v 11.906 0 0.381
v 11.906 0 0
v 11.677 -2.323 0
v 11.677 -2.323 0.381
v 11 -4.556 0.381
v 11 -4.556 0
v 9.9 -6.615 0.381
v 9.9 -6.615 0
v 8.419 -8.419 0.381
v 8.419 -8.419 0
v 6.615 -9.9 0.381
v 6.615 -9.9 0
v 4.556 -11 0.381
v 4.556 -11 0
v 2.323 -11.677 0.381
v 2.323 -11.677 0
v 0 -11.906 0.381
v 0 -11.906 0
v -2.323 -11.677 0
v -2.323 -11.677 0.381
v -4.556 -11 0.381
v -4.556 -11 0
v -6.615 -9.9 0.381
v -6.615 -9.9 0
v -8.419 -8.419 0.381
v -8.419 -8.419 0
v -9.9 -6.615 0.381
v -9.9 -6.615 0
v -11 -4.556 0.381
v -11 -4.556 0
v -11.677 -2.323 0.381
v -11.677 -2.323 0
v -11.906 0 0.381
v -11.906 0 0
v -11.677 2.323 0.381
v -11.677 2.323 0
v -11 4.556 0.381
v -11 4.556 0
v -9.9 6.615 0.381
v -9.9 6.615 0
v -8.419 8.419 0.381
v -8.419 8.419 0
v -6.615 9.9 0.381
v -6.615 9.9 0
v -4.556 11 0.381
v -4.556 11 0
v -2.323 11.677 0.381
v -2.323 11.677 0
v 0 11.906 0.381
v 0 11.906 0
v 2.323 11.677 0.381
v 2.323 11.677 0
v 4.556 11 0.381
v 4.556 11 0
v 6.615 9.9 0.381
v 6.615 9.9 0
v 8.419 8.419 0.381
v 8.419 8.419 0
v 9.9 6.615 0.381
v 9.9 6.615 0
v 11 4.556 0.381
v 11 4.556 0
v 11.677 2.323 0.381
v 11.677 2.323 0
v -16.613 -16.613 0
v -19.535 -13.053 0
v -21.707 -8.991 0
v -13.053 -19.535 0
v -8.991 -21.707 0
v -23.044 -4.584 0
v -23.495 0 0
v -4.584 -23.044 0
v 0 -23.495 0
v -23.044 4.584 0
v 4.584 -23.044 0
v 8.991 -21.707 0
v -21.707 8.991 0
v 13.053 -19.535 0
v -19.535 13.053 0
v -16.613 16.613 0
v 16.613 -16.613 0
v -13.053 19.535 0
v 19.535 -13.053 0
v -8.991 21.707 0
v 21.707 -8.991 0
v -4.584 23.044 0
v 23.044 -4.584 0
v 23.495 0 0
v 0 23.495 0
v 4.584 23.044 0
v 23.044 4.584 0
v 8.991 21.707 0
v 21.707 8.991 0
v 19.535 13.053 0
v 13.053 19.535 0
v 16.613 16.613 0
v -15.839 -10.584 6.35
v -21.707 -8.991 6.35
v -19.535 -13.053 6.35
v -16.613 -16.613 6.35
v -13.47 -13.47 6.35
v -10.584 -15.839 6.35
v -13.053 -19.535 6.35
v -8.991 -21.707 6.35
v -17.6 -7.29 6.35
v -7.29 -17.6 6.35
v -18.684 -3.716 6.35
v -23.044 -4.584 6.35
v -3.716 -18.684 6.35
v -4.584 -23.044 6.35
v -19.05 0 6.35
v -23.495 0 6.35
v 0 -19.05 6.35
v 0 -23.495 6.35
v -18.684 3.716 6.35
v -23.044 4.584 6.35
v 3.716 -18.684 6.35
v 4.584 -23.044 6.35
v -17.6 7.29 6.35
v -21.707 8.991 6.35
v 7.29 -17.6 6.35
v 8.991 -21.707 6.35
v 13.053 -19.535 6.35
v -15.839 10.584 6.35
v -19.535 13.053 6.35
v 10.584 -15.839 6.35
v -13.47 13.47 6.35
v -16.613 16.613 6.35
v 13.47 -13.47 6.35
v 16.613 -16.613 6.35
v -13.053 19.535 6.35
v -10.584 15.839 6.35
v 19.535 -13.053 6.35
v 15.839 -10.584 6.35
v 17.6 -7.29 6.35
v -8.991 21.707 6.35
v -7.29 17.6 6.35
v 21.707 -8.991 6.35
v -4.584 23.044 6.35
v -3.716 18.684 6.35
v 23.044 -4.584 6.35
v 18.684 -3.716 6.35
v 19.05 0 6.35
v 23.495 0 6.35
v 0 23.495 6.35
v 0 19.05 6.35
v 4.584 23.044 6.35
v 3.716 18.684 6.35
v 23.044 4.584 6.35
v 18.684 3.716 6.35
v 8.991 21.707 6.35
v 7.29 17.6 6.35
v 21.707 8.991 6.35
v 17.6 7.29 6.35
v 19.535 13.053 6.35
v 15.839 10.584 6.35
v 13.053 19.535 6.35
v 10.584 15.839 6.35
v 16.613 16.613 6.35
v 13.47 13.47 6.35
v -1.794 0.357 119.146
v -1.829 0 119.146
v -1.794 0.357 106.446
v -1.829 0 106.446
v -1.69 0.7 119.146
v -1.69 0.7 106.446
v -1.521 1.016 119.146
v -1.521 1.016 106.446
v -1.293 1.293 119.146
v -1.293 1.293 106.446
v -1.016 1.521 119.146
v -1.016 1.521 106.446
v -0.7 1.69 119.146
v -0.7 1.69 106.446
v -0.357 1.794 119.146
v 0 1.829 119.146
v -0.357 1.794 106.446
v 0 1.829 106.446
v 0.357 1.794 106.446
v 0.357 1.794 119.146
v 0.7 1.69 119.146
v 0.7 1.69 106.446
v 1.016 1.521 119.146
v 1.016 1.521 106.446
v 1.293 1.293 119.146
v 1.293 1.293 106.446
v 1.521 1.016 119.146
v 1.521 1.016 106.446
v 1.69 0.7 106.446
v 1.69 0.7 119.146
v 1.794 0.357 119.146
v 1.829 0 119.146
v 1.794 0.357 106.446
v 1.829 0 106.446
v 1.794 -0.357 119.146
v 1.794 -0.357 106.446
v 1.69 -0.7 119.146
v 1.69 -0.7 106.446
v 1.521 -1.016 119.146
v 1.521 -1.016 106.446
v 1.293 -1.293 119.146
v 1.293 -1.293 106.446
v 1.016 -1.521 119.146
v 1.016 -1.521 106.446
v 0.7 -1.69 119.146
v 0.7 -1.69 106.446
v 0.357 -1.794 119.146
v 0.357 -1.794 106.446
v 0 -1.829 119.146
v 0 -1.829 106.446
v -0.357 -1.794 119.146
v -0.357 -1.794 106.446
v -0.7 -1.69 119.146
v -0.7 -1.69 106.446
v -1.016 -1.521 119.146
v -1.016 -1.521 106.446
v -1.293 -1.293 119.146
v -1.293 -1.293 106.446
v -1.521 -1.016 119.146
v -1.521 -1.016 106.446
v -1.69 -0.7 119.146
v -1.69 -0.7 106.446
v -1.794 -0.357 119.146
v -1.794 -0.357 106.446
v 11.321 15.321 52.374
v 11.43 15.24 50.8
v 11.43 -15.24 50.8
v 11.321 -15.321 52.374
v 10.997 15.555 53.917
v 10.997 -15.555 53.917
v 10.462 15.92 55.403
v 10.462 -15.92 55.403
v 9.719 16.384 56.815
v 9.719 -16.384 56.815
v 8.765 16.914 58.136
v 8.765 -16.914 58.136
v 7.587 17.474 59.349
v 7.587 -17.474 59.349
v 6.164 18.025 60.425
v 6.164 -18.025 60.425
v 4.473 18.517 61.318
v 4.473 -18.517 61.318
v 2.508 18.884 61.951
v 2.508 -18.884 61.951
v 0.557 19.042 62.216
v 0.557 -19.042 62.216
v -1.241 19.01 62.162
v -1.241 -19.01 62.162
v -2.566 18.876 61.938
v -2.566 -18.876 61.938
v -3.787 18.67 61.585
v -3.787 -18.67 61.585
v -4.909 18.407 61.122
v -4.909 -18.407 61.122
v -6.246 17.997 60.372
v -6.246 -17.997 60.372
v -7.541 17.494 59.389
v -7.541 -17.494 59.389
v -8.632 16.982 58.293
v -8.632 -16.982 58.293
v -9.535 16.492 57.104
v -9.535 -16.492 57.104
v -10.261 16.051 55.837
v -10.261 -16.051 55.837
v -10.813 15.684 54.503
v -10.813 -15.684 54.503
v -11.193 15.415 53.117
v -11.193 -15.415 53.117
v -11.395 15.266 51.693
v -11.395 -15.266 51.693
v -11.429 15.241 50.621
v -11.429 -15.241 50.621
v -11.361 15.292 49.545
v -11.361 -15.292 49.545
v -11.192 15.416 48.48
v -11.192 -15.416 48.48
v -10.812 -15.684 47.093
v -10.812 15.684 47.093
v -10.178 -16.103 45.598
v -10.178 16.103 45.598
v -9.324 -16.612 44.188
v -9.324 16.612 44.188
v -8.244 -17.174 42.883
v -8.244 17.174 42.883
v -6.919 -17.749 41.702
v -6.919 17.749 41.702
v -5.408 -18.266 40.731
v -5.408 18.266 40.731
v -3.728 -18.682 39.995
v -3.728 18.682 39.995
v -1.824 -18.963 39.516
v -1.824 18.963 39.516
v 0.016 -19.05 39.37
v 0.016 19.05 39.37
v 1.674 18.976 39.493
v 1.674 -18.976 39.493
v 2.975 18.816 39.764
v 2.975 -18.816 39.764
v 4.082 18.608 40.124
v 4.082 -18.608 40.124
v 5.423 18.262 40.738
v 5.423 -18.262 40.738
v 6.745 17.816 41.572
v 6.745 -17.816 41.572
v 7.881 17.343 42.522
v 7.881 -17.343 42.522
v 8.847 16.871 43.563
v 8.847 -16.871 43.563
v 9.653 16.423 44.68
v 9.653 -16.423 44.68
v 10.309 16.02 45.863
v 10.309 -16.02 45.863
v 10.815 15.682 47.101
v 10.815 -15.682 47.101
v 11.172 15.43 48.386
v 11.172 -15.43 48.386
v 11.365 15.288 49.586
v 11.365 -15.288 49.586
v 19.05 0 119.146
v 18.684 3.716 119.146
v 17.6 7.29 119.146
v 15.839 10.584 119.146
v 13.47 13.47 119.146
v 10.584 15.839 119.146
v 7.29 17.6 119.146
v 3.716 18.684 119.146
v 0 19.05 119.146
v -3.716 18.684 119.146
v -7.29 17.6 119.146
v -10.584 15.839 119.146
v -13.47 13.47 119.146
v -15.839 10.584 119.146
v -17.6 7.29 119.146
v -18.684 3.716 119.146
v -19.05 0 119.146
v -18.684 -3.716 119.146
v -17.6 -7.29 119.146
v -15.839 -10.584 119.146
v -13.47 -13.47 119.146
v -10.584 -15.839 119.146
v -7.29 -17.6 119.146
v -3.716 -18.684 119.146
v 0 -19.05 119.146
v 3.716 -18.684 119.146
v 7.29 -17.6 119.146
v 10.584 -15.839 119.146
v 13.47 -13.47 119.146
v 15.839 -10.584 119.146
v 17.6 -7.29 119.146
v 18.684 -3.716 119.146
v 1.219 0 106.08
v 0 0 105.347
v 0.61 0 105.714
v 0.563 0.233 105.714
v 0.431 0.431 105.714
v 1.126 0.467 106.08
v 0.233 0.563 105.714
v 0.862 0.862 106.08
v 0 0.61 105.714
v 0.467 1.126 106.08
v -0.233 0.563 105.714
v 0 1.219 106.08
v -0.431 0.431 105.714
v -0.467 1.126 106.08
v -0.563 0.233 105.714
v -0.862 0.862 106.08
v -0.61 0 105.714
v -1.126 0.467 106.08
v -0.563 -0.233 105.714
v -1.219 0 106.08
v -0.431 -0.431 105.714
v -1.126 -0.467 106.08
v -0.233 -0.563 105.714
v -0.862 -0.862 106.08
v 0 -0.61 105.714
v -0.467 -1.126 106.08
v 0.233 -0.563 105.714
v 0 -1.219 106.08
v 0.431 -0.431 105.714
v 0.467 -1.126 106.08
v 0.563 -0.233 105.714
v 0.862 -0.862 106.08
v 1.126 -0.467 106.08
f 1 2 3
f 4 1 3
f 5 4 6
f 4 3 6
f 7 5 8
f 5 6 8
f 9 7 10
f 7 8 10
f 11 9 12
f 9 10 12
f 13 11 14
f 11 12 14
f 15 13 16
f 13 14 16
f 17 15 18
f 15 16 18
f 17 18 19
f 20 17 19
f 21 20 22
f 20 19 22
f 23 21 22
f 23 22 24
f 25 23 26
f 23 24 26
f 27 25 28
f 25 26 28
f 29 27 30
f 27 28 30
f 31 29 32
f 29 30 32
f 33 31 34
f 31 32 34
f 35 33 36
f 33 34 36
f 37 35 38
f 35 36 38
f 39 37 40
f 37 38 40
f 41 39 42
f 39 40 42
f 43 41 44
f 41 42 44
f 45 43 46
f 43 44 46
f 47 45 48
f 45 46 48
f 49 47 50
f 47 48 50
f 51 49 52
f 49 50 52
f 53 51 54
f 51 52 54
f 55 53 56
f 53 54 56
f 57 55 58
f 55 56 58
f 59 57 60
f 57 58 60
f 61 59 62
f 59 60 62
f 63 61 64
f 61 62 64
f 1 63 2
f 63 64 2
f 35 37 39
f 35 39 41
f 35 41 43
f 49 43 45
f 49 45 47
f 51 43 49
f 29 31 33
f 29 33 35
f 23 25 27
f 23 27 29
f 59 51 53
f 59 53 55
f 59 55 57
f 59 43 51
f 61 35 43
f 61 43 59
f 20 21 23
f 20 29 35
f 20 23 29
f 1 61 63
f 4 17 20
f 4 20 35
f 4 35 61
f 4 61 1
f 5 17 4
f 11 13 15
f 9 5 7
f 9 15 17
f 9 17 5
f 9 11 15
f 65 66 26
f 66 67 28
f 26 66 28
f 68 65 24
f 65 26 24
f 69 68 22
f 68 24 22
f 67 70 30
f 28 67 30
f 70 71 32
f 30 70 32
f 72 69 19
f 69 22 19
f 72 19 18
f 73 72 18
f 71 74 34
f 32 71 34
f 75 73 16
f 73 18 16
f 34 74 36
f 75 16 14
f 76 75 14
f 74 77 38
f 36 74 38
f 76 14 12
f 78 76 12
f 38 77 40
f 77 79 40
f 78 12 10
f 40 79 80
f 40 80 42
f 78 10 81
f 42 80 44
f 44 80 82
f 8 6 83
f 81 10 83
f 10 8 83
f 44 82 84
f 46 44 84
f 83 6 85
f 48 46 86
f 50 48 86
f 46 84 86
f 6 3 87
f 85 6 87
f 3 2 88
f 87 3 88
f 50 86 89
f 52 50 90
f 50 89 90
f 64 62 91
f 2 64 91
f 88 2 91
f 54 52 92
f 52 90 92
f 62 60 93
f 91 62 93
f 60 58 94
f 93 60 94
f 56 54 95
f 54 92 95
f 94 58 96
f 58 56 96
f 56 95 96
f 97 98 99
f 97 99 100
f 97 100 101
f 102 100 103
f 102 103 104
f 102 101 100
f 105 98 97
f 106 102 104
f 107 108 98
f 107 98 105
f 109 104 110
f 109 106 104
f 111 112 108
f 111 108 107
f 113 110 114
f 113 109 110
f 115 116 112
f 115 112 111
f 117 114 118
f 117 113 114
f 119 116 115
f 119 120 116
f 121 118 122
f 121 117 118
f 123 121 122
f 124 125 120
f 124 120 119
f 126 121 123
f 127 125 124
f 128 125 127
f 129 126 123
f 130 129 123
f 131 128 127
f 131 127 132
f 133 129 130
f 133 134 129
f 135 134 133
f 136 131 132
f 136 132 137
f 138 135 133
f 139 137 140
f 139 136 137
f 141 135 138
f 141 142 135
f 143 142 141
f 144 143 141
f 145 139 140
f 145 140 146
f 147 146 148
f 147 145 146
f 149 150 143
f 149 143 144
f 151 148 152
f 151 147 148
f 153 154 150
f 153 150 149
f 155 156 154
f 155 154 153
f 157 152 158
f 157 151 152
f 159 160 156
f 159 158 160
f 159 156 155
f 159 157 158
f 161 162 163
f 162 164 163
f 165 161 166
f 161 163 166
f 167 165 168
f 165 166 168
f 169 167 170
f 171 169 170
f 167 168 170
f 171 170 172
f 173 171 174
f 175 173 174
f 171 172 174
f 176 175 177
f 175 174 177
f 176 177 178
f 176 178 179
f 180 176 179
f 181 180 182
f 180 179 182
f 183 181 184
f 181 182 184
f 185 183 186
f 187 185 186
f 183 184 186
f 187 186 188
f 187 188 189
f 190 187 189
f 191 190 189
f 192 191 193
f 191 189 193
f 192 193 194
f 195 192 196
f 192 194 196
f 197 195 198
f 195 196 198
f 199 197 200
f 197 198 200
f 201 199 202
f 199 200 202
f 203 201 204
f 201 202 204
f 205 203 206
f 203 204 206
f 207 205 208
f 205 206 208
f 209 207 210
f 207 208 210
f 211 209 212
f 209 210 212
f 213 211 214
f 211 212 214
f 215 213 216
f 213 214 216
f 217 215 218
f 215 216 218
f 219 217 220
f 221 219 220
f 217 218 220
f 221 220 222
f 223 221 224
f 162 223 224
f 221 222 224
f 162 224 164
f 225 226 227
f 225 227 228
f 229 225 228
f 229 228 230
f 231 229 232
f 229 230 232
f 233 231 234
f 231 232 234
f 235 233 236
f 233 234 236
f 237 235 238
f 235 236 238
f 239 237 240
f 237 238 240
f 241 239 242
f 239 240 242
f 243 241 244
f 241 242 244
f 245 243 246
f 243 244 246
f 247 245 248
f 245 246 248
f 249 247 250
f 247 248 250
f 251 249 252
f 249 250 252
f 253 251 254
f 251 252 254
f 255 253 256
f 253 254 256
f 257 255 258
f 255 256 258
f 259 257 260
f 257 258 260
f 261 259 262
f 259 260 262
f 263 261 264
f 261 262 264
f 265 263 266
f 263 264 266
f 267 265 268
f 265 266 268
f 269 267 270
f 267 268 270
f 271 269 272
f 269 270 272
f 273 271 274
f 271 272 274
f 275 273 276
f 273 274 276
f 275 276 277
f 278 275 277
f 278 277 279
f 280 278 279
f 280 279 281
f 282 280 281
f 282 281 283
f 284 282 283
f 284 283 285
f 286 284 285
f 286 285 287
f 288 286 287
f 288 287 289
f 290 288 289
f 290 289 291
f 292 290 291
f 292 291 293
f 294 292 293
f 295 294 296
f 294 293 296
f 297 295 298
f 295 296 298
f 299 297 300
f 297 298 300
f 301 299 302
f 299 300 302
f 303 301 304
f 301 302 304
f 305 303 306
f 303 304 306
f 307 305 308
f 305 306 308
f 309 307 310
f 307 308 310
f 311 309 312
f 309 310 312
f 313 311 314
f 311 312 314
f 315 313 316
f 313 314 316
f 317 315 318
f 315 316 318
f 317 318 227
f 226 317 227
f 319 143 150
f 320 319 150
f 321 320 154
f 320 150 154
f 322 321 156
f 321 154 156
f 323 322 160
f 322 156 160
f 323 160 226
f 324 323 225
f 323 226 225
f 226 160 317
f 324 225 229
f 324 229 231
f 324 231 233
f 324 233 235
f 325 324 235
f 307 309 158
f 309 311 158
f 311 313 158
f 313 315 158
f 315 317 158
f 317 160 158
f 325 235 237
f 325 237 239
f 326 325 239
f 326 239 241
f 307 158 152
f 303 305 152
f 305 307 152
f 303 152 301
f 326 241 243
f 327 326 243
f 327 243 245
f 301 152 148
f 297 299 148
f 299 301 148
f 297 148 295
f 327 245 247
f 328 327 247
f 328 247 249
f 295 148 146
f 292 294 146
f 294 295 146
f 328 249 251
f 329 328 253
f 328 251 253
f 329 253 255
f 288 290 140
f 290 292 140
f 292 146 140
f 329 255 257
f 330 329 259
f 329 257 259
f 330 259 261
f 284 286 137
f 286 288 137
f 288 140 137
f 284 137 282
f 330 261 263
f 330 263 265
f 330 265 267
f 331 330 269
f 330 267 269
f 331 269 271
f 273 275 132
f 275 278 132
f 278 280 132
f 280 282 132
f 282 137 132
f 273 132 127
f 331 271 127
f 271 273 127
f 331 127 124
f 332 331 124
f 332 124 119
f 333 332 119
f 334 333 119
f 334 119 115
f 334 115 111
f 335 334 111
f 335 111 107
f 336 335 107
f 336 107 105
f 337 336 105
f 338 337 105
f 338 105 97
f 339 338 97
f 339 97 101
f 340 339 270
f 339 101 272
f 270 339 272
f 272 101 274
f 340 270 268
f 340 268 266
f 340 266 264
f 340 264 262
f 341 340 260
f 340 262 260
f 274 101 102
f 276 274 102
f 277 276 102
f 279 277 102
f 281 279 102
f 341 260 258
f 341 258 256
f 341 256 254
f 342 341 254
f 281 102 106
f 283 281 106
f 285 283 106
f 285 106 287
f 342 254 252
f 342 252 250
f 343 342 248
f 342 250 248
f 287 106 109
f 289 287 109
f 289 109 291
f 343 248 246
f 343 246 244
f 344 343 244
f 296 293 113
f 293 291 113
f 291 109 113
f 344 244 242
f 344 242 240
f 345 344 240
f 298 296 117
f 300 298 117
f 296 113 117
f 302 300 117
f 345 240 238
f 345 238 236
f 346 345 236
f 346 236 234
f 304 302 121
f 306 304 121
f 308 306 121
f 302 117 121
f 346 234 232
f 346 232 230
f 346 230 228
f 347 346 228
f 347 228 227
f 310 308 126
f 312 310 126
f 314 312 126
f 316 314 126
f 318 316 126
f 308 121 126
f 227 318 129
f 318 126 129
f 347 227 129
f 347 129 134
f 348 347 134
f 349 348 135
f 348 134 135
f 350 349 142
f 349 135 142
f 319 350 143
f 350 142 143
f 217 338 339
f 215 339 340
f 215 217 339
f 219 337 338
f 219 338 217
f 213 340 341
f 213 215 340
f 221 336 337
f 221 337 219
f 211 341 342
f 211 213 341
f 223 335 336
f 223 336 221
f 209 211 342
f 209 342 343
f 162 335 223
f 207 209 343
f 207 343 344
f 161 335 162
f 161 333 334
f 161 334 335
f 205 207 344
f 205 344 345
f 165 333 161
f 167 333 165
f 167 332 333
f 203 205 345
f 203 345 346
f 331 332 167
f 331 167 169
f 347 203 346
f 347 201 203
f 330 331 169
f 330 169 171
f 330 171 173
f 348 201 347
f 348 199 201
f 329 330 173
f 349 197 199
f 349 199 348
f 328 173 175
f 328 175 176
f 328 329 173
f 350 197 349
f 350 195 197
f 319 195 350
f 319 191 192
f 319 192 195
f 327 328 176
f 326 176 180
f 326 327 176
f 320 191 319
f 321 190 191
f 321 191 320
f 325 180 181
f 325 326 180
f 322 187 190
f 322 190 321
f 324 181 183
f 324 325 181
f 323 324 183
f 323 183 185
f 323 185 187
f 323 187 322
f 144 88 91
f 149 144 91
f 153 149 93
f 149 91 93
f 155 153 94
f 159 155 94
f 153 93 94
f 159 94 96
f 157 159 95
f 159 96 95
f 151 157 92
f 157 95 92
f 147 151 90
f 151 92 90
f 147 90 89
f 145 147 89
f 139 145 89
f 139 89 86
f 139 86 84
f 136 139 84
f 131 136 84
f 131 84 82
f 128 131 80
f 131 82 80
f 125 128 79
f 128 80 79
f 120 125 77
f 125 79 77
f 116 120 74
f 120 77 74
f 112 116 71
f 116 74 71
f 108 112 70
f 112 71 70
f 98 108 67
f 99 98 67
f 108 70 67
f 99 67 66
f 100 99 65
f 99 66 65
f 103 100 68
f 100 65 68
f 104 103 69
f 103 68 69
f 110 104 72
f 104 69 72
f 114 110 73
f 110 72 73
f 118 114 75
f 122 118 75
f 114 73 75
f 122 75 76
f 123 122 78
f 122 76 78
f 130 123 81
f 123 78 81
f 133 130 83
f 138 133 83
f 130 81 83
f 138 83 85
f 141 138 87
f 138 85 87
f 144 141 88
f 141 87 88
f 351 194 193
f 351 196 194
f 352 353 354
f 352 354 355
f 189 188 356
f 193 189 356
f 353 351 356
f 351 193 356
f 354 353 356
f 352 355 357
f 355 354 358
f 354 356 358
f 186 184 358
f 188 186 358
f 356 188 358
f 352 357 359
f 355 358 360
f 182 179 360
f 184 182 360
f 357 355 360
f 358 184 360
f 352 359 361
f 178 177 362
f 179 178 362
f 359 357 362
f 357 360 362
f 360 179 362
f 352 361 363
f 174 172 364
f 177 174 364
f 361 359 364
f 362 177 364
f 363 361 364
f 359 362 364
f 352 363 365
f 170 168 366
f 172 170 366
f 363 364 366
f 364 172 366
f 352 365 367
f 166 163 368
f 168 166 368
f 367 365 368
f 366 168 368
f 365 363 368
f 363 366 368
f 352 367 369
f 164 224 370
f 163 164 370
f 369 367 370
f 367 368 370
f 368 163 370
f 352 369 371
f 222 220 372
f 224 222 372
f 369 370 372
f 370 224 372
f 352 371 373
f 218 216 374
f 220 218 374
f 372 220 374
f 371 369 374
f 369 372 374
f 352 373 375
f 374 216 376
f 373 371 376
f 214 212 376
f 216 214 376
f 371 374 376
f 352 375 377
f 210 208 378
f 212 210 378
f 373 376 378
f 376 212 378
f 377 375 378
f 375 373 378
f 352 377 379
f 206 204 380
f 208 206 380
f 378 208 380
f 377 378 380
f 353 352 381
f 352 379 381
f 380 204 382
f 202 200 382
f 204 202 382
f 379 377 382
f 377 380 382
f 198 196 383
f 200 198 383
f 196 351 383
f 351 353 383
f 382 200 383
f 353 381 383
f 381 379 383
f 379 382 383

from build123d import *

# Parameters (mm, degrees)
F0_R     = 23.495
F0_R_2   = 19.05
F1_DEPTH = 6.35
F2_DEPTH = 119.14632
F4_D     = 3.6576
F4_DEPTH = 12.7
F4_TIP   = 1.0988539001
F5_R     = 11.43
F6_DEPTH = 25.4
F7_R     = 11.90625
F8_DEPTH = 0.381


with BuildPart() as f1:
    # F0 (on Top) → F1 (new body)
    with BuildSketch(Plane.XY):
        Circle(F0_R)
        Circle(F0_R_2, mode=Mode.SUBTRACT)
    extrude(amount=F1_DEPTH)

    # F0 (on Top) → F2 (join)
    with BuildSketch(Plane.XY):
        Circle(F0_R_2)
    extrude(amount=F2_DEPTH)

    # F4
    with Locations(Plane.XY.offset(119.14632)):
        with Locations((0, 0)):
            Hole(F4_D / 2, depth=F4_DEPTH)
            with Locations((0, 0, -(F4_DEPTH + F4_TIP / 2))):  # 118° drill point
                Cone(0, F4_D / 2, F4_TIP, mode=Mode.SUBTRACT)

    # F5 (on Front) → F6 (cut, symmetric)
    with BuildSketch(Plane.XZ):
        with Locations((0, 50.8)):
            Circle(F5_R)
    extrude(amount=F6_DEPTH, both=True, mode=Mode.SUBTRACT)

    # F7 (on face) → F8 (cut)
    with BuildSketch(Plane(origin=(0, 0, 0), x_dir=(1, 0, 0), z_dir=(0, 0, -1))):
        Circle(F7_R)
    extrude(amount=-F8_DEPTH, mode=Mode.SUBTRACT)


solid = f1.part
